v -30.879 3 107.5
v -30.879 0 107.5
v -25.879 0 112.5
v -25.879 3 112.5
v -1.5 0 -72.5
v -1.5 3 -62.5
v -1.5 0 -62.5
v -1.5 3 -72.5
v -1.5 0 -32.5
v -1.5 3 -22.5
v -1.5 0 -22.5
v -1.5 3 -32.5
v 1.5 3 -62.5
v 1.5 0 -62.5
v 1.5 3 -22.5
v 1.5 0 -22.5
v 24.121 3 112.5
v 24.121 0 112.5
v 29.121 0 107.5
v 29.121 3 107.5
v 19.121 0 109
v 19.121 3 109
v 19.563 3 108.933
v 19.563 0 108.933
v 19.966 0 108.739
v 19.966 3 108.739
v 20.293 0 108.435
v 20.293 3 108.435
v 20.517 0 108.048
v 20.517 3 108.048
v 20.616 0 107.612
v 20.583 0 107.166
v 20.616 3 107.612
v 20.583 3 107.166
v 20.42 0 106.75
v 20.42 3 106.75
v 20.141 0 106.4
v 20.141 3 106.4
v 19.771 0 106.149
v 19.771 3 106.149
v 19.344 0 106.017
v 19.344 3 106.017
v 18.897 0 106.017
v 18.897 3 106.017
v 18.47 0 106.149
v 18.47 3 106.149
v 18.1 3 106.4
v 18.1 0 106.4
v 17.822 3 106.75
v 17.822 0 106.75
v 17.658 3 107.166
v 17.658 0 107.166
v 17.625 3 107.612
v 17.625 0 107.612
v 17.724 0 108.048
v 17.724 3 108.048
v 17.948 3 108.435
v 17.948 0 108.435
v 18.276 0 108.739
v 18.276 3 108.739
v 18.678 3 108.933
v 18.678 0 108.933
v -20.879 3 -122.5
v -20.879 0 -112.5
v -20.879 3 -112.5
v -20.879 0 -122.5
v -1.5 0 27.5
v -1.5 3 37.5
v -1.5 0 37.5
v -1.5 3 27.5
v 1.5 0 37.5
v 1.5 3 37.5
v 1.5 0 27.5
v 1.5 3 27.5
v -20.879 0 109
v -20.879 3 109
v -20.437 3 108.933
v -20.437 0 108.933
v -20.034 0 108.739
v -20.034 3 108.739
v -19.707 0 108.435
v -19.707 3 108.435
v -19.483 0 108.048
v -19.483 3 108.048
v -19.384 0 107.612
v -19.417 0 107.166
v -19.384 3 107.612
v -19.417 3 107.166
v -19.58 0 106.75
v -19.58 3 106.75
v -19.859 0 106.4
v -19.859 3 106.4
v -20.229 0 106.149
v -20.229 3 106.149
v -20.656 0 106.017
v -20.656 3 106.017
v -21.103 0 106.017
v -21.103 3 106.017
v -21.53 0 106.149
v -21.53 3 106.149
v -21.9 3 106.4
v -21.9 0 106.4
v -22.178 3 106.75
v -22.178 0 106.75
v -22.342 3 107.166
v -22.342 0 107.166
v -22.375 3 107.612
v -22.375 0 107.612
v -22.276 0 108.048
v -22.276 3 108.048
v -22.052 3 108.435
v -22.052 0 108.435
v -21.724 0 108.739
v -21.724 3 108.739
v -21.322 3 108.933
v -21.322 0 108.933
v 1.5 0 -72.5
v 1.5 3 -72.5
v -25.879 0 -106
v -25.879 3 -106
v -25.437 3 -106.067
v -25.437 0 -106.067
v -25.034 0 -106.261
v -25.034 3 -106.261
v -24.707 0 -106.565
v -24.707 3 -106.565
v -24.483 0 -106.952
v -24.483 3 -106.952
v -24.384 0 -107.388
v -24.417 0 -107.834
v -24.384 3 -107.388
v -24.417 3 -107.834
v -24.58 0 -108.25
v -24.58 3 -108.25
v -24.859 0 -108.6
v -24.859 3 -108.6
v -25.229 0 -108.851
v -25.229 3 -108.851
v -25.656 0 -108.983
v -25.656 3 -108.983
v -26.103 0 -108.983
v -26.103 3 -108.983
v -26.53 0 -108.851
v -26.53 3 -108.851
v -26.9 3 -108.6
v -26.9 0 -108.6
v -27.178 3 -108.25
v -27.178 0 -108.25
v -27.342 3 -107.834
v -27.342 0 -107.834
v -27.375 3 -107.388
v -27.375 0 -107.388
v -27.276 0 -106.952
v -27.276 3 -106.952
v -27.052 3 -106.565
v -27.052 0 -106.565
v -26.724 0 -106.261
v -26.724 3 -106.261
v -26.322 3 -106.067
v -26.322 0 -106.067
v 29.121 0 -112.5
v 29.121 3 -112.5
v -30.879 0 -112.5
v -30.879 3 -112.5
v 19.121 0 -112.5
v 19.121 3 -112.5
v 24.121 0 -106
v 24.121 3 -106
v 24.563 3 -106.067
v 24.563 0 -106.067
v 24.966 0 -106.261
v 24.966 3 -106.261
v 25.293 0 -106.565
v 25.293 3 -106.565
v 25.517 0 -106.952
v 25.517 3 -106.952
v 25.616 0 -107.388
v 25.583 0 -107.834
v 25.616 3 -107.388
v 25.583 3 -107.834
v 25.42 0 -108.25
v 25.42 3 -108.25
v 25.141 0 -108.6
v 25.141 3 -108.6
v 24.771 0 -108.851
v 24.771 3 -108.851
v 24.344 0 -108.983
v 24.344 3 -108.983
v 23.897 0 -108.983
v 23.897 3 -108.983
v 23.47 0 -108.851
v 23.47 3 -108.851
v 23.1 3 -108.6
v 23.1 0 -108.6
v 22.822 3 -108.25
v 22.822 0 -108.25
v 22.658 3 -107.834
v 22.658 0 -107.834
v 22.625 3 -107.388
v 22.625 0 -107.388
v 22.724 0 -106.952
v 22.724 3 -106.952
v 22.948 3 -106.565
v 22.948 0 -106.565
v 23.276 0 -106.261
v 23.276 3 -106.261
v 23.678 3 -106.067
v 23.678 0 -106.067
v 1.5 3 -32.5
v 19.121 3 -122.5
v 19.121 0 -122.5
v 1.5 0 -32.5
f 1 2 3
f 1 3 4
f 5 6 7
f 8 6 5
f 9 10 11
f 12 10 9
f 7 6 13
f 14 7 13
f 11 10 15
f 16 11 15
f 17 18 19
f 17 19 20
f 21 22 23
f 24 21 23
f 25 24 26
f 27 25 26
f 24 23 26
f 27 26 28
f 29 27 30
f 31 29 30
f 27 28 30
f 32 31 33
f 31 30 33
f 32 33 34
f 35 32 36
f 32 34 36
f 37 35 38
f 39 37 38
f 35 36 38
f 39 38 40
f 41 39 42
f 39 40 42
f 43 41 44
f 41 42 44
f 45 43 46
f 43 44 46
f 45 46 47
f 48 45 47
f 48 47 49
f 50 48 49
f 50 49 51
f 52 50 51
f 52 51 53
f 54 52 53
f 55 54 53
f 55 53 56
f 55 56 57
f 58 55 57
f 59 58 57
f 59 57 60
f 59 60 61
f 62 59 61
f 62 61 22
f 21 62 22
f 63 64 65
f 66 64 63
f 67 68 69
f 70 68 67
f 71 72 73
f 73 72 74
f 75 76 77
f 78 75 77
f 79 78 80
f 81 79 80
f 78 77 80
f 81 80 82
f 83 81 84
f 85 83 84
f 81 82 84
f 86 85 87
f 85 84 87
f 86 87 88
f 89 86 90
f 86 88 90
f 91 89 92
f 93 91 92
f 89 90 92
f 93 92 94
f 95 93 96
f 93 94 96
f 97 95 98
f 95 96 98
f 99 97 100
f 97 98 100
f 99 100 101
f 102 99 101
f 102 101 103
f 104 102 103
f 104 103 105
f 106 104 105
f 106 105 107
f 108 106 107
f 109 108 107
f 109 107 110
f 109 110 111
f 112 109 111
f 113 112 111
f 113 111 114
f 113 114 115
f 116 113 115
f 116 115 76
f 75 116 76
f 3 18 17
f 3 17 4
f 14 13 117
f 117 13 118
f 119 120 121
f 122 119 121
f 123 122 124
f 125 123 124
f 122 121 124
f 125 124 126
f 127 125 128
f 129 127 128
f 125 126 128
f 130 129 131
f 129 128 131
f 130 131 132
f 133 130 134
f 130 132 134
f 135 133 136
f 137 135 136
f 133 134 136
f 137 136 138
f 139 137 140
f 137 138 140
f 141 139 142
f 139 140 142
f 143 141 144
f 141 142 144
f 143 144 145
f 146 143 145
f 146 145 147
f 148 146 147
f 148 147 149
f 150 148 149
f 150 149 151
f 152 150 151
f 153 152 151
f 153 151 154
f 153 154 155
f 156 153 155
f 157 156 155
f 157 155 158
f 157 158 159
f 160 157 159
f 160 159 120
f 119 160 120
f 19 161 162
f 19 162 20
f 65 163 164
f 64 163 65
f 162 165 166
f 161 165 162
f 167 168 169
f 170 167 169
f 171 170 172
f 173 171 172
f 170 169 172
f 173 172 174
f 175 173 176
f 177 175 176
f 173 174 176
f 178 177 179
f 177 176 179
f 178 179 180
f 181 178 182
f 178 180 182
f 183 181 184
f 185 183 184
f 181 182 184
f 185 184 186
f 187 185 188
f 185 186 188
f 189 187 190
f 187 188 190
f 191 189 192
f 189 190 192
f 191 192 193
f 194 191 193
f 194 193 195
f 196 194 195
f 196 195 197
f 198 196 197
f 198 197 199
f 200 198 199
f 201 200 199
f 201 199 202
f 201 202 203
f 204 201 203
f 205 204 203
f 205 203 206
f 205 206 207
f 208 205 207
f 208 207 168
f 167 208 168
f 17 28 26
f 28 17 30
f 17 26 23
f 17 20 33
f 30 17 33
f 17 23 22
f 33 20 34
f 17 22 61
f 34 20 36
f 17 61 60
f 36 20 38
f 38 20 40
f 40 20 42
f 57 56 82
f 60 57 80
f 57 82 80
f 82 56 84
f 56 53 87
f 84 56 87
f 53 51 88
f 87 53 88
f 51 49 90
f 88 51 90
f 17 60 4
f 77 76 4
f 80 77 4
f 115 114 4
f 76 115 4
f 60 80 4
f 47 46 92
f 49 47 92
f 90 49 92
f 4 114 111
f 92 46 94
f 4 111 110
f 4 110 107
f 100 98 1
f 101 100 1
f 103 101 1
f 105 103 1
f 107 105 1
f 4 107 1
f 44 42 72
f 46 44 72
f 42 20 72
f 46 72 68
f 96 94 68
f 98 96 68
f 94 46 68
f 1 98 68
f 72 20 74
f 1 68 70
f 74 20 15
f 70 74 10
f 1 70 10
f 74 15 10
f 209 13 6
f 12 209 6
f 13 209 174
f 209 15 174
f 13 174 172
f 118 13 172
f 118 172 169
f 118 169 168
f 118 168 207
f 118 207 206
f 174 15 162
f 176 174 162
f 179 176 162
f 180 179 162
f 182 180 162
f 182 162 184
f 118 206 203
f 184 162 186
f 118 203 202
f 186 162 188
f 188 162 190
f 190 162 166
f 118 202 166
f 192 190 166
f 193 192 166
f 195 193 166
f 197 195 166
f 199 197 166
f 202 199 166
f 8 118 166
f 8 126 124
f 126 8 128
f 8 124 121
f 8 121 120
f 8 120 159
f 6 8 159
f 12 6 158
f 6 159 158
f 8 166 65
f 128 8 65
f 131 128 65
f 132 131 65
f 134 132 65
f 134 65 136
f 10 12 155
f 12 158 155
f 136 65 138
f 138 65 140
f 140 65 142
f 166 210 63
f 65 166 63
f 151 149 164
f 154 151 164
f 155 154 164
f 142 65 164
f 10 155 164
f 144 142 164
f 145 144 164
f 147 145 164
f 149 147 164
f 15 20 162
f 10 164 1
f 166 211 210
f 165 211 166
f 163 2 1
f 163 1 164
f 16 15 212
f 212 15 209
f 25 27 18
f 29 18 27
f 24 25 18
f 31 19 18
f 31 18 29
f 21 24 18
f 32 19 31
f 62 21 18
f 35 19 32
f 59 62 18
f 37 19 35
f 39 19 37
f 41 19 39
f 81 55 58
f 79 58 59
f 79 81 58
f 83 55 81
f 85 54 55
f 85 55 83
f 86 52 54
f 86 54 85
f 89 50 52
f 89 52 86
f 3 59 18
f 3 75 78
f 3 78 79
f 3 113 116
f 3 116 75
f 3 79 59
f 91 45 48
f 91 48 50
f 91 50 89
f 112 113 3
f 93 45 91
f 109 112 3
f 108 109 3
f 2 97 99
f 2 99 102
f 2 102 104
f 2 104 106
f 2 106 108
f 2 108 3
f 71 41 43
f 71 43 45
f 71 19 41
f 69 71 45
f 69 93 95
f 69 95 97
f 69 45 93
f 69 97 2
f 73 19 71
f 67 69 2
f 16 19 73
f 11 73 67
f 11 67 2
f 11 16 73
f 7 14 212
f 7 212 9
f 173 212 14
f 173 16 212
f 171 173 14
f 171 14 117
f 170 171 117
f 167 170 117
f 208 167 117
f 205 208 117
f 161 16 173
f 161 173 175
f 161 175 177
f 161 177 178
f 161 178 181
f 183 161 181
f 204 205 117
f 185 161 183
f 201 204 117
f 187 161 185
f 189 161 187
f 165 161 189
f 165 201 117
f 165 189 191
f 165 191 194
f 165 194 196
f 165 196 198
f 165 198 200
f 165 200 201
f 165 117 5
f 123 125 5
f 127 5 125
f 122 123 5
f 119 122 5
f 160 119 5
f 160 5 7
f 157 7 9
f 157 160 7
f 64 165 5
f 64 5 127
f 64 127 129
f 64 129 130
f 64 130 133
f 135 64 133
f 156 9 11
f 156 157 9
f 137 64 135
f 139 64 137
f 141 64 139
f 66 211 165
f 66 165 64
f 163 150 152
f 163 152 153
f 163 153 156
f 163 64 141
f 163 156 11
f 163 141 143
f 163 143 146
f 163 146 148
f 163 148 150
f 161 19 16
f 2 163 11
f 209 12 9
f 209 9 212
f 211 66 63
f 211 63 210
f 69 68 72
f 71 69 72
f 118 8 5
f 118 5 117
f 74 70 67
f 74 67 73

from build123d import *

# Parameters (mm, degrees)
BOSS_EXTRUDE1_DEPTH = 3
SKETCH2_R           = 1.5
SKETCH2_W           = 3
SKETCH2_H           = 10
CUT_EXTRUDE1_DEPTH  = 25
CHAMFER1_SIZE       = 5


with BuildPart() as part:
    # Sketch1 → Boss-Extrude1 (new body)
    with BuildSketch(Plane(origin=(0, 0, 0), x_dir=(1, 0, 0), z_dir=(0, 1, 0))):
        Polygon((19.120621977, 112.5), (29.120621977, 112.5), (29.120621977, -112.5), (-30.879378023, -112.5), (-30.879378023, 112.5), (-20.879378023, 112.5), (-20.879378023, 122.5), (19.120621977, 122.5), align=None)
    extrude(amount=BOSS_EXTRUDE1_DEPTH)

    # Sketch2 → Cut-Extrude1 (cut)
    with BuildSketch(Plane(origin=(0, 3, 0), x_dir=(1, 0, 0), z_dir=(0, 1, 0))):
        with Locations(Location((24.120621977, 107.5, 0), (0, 0, 270))):
            Circle(SKETCH2_R)
        with Locations(Location((-25.879378023, 107.5, 0), (0, 0, 270))):
            Circle(SKETCH2_R)
        with Locations(Location((-20.879378023, -107.5, 0), (0, 0, 270))):
            Circle(SKETCH2_R)
        with Locations(Location((19.120621977, -107.5, 0), (0, 0, 270))):
            Circle(SKETCH2_R)
        with Locations((0, 67.5)):
            Rectangle(SKETCH2_W, SKETCH2_H)
        with Locations((0, -32.5)):
            Rectangle(SKETCH2_W, SKETCH2_H)
        with Locations((0, 27.5)):
            Rectangle(SKETCH2_W, SKETCH2_H)
    extrude(amount=-CUT_EXTRUDE1_DEPTH, mode=Mode.SUBTRACT)

    # Chamfer1
    chamfer1_edges = [part.edges().sort_by_distance(p)[0] for p in [
        (29.120621977, 1.5, 112.5),
        (-30.879378023, 1.5, 112.5),
    ]]
    chamfer(chamfer1_edges, length=CHAMFER1_SIZE)


solid = part.part
